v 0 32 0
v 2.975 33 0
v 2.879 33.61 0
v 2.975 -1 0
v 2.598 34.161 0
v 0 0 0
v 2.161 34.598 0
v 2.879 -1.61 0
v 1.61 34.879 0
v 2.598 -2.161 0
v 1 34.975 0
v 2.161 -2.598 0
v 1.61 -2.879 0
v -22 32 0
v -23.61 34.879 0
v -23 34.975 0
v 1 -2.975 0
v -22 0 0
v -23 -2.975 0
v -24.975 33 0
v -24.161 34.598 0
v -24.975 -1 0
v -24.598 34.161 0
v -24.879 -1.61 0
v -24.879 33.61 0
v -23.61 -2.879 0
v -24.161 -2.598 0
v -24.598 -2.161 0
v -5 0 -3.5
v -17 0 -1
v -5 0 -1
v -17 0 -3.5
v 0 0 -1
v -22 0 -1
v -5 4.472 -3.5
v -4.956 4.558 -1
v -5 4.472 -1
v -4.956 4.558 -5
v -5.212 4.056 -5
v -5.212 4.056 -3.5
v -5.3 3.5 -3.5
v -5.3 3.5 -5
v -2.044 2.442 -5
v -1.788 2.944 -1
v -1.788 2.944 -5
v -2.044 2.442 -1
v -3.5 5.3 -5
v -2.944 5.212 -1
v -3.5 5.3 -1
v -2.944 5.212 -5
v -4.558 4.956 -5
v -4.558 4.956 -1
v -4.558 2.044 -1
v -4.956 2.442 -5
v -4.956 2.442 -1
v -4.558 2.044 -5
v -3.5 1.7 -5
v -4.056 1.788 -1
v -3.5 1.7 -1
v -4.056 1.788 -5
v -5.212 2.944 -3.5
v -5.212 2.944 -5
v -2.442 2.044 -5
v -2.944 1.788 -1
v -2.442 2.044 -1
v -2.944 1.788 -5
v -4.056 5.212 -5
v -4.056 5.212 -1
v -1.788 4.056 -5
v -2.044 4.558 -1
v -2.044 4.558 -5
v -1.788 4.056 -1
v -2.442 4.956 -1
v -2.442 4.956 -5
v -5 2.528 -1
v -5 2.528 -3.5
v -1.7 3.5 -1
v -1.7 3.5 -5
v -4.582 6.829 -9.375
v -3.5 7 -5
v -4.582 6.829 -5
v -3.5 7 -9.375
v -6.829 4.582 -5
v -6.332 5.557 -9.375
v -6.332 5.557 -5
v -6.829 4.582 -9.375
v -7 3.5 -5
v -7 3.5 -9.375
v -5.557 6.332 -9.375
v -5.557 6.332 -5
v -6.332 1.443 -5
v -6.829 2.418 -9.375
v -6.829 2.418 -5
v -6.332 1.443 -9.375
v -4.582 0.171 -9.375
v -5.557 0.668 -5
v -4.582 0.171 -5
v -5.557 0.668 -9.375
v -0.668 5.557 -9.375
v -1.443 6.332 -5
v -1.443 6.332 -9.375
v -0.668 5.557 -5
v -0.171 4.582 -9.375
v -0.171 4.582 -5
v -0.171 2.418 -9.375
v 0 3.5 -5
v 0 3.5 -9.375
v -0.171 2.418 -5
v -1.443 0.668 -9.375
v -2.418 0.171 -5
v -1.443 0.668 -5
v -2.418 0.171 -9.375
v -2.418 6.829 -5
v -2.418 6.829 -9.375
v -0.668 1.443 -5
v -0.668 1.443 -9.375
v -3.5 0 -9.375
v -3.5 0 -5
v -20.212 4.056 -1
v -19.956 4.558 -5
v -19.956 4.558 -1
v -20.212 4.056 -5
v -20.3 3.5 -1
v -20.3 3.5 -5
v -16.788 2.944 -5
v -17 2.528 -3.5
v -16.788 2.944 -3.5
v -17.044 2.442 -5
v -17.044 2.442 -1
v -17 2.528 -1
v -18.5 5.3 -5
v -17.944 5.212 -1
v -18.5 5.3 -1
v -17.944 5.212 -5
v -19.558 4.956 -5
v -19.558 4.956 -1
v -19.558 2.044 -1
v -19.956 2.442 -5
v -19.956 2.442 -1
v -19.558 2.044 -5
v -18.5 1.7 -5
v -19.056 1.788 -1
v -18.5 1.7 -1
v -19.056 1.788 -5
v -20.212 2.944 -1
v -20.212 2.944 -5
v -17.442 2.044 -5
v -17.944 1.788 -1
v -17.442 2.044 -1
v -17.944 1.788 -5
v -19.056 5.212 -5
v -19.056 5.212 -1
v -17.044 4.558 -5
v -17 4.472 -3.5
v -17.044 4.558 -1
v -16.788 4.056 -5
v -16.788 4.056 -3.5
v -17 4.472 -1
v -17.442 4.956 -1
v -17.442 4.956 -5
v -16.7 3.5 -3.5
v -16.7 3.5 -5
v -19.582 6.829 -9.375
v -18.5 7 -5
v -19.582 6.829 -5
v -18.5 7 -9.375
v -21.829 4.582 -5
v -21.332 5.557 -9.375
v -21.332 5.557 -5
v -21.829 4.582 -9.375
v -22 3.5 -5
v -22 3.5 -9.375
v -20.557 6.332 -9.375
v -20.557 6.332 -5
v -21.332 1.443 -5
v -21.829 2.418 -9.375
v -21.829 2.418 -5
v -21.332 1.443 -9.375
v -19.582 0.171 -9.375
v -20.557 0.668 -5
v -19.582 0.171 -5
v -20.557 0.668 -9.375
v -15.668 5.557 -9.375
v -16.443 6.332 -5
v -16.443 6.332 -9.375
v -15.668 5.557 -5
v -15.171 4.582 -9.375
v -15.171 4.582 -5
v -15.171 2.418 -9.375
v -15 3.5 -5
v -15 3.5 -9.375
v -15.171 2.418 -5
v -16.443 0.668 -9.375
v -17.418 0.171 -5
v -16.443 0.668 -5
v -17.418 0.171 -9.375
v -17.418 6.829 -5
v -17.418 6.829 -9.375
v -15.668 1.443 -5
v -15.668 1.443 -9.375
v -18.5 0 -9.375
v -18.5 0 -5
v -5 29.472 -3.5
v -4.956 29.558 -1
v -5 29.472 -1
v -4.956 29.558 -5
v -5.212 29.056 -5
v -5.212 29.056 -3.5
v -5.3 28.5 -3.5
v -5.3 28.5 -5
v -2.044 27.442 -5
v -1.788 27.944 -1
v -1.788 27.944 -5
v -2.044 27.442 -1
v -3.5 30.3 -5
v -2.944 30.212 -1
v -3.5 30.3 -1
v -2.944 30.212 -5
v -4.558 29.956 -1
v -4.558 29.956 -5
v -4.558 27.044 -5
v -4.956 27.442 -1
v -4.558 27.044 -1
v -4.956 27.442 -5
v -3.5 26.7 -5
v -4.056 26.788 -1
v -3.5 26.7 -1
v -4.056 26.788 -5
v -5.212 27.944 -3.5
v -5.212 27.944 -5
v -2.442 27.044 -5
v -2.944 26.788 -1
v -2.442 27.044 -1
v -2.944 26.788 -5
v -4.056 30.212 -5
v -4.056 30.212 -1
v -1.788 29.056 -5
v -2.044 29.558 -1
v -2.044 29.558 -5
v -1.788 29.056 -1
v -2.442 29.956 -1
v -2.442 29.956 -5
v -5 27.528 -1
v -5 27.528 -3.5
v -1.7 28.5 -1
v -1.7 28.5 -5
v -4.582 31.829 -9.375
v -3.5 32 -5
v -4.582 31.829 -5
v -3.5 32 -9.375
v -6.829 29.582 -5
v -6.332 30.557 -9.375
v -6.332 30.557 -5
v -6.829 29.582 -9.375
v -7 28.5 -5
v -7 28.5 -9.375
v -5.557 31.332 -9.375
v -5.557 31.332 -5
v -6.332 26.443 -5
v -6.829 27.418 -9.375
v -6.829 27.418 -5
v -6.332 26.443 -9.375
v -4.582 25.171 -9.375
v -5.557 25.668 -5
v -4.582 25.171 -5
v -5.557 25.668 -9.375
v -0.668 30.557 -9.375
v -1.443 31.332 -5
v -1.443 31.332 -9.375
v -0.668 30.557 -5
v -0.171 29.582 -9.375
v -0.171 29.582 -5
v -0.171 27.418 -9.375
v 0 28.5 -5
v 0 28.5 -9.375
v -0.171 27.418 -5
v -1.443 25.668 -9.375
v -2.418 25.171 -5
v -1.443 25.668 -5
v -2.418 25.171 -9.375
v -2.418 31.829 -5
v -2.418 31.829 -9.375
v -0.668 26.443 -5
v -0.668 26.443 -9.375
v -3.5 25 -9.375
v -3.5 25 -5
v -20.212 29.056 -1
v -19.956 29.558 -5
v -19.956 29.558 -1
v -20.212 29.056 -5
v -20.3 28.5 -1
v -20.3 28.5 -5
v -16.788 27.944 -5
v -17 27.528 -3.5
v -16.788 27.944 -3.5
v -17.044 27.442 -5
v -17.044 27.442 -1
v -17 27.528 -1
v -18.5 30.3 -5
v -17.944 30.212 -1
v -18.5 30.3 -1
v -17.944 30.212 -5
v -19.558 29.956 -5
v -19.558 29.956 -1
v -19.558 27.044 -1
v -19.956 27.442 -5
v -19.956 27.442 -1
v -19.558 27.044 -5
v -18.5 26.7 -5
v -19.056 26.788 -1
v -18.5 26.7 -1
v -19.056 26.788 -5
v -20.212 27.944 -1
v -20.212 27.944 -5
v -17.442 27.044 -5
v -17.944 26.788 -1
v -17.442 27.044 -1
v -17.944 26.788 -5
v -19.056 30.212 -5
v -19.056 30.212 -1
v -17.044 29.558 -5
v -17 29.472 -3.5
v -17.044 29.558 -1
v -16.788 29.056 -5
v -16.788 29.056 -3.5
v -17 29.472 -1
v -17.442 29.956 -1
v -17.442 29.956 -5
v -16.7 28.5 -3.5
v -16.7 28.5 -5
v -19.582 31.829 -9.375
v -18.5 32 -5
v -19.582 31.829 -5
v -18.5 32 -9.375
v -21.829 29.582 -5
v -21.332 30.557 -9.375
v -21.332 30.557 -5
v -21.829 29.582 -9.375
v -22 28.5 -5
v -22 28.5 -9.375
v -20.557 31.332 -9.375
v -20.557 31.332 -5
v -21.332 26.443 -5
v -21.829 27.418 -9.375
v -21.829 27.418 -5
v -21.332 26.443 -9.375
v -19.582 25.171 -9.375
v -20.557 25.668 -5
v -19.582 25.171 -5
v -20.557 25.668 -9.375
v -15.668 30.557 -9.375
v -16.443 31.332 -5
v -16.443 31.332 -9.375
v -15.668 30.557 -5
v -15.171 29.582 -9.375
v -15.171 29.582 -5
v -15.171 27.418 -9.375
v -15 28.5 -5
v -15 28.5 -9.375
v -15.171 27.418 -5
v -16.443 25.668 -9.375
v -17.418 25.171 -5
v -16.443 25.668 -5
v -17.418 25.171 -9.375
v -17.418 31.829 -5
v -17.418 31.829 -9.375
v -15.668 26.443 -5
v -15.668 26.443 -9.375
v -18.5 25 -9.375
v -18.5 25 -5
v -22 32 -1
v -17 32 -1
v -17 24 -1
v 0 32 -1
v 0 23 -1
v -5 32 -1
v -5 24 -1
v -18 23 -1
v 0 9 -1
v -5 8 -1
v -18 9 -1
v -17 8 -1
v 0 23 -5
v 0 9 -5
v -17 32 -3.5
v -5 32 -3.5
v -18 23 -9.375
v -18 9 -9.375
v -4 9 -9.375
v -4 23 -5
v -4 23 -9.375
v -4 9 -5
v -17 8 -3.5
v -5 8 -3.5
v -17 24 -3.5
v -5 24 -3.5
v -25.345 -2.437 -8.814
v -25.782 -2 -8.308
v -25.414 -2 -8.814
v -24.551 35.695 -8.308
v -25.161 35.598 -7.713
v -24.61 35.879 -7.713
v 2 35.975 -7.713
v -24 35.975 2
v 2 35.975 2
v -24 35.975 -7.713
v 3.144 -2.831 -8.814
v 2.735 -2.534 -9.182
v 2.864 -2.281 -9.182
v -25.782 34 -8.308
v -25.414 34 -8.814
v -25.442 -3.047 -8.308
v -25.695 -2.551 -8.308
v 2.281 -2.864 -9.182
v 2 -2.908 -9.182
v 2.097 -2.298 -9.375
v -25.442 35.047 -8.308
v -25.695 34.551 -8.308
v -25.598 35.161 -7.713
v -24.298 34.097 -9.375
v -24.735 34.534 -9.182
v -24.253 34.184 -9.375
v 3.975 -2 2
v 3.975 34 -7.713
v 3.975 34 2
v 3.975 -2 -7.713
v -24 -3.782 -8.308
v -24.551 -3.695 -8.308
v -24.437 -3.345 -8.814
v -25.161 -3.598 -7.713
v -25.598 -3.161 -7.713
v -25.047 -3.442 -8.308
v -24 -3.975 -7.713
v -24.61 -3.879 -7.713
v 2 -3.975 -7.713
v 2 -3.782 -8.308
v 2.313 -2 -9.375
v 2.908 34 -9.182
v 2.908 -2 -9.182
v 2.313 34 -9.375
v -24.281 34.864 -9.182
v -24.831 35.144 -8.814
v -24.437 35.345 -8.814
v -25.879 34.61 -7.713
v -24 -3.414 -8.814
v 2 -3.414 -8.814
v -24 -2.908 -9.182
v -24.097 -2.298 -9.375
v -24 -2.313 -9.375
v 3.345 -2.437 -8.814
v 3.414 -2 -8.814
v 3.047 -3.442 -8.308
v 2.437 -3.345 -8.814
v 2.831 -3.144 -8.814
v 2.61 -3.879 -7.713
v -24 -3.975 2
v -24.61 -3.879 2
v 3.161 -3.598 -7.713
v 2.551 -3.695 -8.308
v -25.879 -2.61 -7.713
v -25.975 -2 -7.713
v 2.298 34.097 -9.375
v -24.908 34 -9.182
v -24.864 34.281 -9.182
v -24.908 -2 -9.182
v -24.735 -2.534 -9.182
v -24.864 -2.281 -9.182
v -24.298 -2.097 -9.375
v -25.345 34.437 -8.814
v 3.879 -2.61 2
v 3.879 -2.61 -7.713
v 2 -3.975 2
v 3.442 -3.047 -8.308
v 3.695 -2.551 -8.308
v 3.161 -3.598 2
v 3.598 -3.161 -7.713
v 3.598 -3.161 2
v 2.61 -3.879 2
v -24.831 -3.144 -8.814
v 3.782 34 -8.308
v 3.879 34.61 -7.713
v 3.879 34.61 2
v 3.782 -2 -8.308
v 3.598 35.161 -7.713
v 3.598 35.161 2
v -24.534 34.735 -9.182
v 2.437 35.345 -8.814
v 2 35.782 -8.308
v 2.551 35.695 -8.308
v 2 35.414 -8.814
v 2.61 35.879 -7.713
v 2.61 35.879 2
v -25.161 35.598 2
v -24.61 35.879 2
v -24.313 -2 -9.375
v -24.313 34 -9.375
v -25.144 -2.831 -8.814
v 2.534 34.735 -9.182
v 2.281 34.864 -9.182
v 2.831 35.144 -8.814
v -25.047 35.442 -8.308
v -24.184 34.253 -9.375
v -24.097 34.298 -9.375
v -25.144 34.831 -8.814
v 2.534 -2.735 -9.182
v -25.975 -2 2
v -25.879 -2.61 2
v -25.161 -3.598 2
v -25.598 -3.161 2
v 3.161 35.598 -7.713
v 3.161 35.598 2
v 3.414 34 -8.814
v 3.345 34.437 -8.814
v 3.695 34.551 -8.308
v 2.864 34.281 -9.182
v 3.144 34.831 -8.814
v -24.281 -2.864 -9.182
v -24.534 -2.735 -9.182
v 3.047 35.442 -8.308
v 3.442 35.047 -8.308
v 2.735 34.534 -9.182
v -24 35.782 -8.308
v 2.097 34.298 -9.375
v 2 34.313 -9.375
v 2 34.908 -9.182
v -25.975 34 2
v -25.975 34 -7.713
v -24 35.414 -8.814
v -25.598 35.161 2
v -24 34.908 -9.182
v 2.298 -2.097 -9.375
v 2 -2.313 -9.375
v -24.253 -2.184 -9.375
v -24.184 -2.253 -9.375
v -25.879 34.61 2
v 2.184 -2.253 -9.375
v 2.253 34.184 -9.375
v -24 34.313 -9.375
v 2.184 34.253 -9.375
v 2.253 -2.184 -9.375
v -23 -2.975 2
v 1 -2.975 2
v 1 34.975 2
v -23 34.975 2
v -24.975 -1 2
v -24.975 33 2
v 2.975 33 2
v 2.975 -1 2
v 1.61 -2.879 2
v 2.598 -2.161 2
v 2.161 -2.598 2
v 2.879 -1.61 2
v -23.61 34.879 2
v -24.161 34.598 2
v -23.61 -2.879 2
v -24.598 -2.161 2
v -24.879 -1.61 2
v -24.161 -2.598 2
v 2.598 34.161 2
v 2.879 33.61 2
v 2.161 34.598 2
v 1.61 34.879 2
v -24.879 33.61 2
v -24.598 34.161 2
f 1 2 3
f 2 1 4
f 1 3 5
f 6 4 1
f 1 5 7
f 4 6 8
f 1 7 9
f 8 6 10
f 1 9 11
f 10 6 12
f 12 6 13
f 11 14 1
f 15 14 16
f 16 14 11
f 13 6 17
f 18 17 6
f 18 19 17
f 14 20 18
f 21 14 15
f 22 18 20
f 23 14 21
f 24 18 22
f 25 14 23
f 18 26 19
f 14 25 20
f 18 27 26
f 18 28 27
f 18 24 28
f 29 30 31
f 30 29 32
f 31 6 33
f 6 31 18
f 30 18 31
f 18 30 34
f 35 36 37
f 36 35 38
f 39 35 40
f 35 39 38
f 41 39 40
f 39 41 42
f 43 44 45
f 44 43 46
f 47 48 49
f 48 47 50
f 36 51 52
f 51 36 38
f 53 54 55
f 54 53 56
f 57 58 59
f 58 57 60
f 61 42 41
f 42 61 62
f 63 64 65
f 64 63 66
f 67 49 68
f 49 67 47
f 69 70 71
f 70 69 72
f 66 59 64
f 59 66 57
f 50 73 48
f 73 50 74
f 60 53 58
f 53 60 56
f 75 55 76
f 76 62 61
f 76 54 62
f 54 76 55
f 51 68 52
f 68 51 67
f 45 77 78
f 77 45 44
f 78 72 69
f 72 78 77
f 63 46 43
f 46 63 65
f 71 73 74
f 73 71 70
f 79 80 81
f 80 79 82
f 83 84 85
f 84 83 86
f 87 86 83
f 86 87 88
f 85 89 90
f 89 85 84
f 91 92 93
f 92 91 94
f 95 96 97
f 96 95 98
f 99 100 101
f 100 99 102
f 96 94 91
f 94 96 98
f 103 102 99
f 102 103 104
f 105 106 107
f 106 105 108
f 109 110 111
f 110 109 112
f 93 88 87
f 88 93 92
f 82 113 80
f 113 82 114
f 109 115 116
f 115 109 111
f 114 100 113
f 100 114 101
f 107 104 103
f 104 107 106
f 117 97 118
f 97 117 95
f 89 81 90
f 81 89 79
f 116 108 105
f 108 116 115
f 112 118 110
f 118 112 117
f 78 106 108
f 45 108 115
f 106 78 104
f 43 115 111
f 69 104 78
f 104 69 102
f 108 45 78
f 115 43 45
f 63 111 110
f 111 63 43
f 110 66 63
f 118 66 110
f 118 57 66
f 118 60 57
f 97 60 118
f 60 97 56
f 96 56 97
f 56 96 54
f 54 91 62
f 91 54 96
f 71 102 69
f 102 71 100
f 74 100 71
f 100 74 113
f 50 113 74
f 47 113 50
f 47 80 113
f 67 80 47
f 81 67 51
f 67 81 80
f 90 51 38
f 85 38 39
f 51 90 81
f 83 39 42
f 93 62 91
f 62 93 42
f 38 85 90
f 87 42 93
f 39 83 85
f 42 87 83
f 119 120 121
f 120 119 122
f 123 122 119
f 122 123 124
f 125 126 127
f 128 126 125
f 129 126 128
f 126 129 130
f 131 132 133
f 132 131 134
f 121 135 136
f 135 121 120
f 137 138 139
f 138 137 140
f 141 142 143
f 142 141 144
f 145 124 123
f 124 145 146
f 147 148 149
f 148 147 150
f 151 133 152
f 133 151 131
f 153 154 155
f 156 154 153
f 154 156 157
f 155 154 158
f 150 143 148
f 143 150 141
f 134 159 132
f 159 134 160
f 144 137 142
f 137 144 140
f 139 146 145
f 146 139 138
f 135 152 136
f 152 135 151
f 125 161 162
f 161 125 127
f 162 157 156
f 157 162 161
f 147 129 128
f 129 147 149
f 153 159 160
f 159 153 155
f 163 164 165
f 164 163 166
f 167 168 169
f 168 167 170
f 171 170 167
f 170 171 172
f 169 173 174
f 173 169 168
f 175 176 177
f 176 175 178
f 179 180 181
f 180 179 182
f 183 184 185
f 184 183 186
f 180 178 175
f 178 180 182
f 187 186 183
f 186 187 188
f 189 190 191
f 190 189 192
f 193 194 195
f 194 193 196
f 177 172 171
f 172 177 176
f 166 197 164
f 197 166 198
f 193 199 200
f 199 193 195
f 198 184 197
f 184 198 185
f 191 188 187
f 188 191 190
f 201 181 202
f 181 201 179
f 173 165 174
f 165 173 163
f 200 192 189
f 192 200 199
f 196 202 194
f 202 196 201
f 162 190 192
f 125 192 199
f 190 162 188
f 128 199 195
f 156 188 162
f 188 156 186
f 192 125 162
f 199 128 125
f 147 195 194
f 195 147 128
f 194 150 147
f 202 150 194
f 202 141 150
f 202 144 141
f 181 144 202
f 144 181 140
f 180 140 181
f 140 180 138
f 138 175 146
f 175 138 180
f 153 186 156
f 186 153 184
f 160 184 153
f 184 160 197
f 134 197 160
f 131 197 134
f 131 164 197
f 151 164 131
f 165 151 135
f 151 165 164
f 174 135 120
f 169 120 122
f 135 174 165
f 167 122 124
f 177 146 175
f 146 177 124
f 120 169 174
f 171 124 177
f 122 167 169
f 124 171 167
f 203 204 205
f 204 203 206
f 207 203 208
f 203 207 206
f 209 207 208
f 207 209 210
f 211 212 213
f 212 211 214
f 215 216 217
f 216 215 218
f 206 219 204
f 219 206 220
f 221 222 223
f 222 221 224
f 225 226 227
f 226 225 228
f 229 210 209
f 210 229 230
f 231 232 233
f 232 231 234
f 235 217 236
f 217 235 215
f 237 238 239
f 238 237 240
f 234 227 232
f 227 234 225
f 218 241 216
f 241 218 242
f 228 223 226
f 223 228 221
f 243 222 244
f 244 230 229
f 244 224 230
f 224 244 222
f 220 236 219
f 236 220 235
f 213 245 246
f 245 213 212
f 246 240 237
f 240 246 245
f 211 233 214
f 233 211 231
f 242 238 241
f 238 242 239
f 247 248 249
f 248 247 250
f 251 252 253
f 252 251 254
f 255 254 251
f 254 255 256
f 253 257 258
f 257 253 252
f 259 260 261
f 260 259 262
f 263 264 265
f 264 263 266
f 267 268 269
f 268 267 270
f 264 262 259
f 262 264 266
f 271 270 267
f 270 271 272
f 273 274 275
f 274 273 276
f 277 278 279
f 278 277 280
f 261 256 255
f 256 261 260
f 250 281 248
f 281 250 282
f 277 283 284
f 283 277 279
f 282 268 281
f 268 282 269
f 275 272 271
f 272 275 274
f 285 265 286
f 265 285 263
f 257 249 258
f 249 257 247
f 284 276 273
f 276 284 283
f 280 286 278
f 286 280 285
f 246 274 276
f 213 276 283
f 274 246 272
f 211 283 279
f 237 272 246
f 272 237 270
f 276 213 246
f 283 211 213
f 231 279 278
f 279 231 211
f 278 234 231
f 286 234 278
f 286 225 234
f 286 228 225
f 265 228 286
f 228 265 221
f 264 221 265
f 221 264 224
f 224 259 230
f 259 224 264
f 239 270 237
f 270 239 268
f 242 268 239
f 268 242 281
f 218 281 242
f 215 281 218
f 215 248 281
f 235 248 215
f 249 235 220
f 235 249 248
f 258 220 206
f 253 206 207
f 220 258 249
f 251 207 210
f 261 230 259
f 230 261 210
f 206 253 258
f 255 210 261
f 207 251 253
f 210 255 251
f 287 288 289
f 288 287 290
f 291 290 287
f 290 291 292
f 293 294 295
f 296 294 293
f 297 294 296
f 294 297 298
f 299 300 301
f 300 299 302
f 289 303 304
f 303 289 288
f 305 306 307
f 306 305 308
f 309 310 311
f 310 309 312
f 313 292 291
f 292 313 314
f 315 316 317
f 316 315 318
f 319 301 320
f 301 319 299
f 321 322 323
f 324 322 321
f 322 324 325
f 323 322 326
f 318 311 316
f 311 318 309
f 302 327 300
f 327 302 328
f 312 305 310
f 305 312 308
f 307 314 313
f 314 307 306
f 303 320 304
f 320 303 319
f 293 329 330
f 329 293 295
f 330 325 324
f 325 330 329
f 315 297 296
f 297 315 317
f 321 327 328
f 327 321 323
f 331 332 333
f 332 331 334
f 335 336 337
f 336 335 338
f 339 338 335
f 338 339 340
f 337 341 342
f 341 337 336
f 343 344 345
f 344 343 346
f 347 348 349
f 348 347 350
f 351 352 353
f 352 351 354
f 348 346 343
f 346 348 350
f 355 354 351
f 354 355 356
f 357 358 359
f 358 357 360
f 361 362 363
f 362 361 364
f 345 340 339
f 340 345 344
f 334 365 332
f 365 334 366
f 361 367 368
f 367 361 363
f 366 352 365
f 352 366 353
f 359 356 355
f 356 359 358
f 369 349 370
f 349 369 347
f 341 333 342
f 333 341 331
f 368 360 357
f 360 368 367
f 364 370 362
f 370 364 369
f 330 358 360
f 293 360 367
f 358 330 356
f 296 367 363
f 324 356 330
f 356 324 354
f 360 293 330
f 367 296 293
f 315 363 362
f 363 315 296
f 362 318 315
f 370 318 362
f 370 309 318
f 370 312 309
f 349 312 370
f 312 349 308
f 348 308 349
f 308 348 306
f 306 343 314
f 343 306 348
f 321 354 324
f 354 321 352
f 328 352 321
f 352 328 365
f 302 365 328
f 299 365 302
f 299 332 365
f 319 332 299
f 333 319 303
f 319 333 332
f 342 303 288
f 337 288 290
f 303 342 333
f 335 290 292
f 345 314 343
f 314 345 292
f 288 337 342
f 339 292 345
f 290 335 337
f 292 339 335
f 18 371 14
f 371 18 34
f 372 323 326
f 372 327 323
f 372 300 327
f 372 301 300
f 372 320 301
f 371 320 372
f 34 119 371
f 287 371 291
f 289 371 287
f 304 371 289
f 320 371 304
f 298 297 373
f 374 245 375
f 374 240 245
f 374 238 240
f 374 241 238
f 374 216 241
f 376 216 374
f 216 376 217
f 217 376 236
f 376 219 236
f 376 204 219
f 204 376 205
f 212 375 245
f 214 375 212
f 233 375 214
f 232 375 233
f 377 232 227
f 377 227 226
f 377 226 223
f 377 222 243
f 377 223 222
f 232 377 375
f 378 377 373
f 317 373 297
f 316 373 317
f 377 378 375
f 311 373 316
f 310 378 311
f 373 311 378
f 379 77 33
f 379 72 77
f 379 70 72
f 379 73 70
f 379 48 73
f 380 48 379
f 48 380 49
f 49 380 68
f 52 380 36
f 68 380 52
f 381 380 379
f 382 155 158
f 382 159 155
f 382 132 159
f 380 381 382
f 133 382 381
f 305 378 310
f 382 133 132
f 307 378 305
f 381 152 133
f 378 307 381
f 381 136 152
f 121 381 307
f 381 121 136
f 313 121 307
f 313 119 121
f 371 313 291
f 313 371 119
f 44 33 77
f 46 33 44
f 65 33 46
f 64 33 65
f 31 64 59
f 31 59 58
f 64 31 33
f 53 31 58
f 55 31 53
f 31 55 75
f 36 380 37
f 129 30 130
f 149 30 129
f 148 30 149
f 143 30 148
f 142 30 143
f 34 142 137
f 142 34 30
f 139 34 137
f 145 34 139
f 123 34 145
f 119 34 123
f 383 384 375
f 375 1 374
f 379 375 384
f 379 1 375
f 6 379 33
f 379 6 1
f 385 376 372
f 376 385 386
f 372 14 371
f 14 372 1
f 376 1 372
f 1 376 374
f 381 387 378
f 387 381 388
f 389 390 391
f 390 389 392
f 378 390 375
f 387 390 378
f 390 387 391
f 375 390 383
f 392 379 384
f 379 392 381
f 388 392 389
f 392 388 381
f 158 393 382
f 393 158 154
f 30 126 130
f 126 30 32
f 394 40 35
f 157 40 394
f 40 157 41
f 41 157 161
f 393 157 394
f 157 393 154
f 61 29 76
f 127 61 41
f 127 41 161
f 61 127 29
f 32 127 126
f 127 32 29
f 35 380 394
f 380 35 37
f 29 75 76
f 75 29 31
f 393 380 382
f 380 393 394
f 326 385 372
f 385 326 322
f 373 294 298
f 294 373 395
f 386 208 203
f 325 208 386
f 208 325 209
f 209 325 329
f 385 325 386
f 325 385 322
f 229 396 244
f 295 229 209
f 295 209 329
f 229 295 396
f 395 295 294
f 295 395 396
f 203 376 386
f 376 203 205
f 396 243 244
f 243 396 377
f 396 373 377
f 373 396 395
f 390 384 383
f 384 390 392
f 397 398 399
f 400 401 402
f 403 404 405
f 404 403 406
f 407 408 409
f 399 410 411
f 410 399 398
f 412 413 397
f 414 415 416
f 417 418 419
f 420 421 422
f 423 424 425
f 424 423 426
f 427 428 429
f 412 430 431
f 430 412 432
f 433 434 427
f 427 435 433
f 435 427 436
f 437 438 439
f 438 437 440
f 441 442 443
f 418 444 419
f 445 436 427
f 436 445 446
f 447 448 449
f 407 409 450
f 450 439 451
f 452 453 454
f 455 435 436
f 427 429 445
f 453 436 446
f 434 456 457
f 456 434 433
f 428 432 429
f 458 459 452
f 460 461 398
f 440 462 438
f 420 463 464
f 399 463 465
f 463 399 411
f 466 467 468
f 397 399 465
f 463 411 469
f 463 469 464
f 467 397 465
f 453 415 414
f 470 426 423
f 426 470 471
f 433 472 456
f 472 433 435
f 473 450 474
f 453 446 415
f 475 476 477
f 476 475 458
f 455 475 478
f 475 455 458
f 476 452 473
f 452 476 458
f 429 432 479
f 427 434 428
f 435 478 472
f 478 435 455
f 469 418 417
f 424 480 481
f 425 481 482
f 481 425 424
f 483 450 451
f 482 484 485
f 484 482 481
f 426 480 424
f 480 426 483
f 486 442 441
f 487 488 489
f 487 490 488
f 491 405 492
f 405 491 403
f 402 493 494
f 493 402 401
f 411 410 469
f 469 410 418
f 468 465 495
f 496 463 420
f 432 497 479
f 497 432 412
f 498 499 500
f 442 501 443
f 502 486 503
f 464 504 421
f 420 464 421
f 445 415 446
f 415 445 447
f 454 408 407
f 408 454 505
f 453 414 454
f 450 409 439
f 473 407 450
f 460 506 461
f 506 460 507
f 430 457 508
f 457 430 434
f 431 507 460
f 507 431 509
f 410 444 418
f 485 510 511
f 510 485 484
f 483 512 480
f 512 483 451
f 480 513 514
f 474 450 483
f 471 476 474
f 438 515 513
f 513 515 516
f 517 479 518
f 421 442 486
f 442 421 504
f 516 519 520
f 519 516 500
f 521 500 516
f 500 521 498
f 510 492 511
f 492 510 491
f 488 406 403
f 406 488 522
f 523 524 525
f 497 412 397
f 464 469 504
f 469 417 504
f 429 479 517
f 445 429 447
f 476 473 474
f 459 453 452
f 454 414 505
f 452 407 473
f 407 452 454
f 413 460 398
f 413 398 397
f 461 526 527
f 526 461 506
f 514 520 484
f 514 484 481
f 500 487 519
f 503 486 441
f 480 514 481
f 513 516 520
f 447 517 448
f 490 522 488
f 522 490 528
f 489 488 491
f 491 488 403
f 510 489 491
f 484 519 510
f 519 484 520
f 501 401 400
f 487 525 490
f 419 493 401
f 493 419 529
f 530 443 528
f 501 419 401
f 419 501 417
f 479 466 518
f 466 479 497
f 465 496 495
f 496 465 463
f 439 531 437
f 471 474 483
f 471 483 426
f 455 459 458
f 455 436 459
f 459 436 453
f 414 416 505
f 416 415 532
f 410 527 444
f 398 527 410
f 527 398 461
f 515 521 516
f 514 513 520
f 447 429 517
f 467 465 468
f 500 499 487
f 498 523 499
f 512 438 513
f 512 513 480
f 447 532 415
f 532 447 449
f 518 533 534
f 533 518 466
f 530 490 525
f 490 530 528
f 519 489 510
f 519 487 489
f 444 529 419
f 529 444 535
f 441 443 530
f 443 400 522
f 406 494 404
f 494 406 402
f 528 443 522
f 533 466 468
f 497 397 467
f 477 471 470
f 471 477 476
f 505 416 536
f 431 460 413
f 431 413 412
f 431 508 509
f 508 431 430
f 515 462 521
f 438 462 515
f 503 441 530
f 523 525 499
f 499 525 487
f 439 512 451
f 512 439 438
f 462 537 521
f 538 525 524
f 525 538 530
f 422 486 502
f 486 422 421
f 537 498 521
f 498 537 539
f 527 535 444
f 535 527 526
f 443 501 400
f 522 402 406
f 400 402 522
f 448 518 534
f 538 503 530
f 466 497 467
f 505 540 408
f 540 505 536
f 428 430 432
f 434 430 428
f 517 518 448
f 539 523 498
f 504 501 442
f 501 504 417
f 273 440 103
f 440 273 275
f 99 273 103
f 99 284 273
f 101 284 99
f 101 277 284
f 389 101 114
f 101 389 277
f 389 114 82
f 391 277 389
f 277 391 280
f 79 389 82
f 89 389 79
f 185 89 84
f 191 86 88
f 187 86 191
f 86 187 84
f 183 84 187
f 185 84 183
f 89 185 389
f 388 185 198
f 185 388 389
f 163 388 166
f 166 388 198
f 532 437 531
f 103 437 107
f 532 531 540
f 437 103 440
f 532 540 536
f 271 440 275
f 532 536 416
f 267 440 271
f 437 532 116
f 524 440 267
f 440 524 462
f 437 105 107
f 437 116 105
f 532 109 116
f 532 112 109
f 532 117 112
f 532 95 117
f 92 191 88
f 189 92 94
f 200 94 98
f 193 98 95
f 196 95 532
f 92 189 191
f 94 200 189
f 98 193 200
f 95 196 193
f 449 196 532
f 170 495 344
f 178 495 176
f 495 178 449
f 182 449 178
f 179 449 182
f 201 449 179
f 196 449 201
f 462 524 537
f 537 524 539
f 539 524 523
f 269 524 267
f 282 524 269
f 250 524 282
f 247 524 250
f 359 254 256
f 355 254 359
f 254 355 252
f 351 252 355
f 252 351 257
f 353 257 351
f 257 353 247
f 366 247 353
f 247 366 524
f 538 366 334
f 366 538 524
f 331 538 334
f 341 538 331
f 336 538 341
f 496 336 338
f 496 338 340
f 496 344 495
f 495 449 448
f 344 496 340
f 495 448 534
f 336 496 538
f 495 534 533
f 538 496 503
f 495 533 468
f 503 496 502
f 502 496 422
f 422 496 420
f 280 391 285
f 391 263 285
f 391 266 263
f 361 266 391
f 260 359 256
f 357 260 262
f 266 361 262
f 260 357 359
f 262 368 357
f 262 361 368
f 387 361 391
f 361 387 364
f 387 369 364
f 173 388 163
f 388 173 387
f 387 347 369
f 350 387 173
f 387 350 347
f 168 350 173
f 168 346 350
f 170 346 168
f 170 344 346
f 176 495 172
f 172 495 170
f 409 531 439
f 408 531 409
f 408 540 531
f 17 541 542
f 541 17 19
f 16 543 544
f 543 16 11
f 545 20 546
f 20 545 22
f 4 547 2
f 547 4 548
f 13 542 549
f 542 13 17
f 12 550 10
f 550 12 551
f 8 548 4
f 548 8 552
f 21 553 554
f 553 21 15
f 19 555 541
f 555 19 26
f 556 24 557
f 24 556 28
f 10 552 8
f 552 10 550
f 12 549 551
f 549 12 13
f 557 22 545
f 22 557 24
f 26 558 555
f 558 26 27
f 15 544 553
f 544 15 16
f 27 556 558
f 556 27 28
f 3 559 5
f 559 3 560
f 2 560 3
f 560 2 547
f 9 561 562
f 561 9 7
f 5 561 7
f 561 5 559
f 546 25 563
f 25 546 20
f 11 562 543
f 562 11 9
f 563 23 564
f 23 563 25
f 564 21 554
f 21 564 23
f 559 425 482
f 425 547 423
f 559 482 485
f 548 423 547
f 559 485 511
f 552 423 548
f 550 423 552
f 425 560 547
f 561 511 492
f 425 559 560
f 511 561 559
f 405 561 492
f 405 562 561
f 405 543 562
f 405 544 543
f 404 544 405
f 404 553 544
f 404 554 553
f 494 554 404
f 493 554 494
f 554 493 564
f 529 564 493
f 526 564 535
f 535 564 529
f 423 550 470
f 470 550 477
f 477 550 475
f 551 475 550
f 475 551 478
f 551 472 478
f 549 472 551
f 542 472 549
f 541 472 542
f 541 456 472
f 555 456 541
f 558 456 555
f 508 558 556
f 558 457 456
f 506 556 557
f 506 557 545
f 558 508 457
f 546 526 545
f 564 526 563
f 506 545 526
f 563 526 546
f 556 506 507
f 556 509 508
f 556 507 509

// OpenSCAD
module pcb()
{

union()
{
 difference()
 {
  union()
  {
   //pcb
   color("green") cube([22,32,1]);
   //button
   color("blue") translate([4,9,0]) cube(14);
  
   //cables
   color("red") translate([5,0,-2.5]) cube([12,8,6]);
   color("red") translate([5,24,-2.5]) cube([12,8,6]);

   // resistor
   color("yellow") translate([0,9,1]) cube([5,14,4]);


   // open below for solderspots
   color("red") translate([5,3.5,-2]) cube([12,8,2]);
   color("red") translate([5,20.5,-2]) cube([12,8,2]);

    color("red") translate([0,10,-2]) cube([4,12,2]);
    color("red") translate([18,10,-2]) cube([4,12,2]);

   color("red") translate([9,14,-2]) cube([4,4,2]);




   // open below for solderspots
  // color("red") translate([0,4,-2]) cube([22,24,2]);


   }
 
  //mounting holes
  translate([3.5,3.5,-1]) cylinder(r=1.6,h=10,$fn=20);
  translate([18.5,3.5,-1]) cylinder(r=1.6,h=10,$fn=20);
  translate([3.5,28.5,-1]) cylinder(r=1.6,h=10,$fn=20);
  translate([18.5,28.5,-1]) cylinder(r=1.6,h=10,$fn=20);
  }
 }
}

module cables()
{




  //cables out
  color("green") translate([7,31,-2]) cube([8,50,2]);
  color("green") translate([7,-50,-2]) cube([8,50,2]);





}




module screws()
{


 translate([3.5,3.5,-25]) cylinder(r=1.8,h=50,$fn=20);
 translate([3.5,3.5,5]) cylinder(r=3.5,h=20,$fn=20);


 translate([18.5,3.5,-25]) cylinder(r=1.8,h=50,$fn=20);
 translate([18.5,3.5,5]) cylinder(r=3.5,h=20,$fn=20);



 translate([3.5,28.5,-25]) cylinder(r=1.8,h=50,$fn=20);
 translate([3.5,28.5,5]) cylinder(r=3.5,h=20,$fn=20);




 translate([18.5,28.5,-25]) cylinder(r=1.8,h=50,$fn=20);
 translate([18.5,28.5,5]) cylinder(r=3.5,h=20,$fn=20);






}



module muttern(height=2)
{
 intersection()
 {
  cube([6.8,10,height], center=true);
  rotate([0,0,120]) cube([6.8,10,height], center=true);
  rotate([0,0,240]) cube([6.8,10,height], center=true);
 }

}



module hull()
{
$fn=10;
minkowski() {
  cube([26,36,12]);
   //rounded corners
  sphere(2, $fn=20);
}

}



module ueberstand()
{

intersection()
{
difference()
{



minkowski() {
  cube([26,36,10]);
   //rounded corners
  sphere(2, $fn=20);
}




translate([1,1,0]) minkowski() {
  cube([24,34,20]);
   //rounded corners
  sphere(2, $fn=20);
}




}

translate([-3,-3,3]) cube([100,100,2]);
}

}




module box()
{
difference()
{
 translate([-2,-2,-4.6]) hull();

 cables();
 screws();

 translate([3.5,3.5,-6]) muttern(5);
 translate([18.5,3.5,-6]) muttern(5);
 translate([3.5,28.5,-6]) muttern(5);
 translate([18.5,28.5,-6]) muttern(5);

 pcb();





}


}









rotate([0,180,0])
 difference()
{


 box(center=true);


translate([0,0,-50]) cube([100,100,100],center=true);
}


// ueberstand
translate([-24,-2,-3]) color("blue") ueberstand(); 




// pcb();
